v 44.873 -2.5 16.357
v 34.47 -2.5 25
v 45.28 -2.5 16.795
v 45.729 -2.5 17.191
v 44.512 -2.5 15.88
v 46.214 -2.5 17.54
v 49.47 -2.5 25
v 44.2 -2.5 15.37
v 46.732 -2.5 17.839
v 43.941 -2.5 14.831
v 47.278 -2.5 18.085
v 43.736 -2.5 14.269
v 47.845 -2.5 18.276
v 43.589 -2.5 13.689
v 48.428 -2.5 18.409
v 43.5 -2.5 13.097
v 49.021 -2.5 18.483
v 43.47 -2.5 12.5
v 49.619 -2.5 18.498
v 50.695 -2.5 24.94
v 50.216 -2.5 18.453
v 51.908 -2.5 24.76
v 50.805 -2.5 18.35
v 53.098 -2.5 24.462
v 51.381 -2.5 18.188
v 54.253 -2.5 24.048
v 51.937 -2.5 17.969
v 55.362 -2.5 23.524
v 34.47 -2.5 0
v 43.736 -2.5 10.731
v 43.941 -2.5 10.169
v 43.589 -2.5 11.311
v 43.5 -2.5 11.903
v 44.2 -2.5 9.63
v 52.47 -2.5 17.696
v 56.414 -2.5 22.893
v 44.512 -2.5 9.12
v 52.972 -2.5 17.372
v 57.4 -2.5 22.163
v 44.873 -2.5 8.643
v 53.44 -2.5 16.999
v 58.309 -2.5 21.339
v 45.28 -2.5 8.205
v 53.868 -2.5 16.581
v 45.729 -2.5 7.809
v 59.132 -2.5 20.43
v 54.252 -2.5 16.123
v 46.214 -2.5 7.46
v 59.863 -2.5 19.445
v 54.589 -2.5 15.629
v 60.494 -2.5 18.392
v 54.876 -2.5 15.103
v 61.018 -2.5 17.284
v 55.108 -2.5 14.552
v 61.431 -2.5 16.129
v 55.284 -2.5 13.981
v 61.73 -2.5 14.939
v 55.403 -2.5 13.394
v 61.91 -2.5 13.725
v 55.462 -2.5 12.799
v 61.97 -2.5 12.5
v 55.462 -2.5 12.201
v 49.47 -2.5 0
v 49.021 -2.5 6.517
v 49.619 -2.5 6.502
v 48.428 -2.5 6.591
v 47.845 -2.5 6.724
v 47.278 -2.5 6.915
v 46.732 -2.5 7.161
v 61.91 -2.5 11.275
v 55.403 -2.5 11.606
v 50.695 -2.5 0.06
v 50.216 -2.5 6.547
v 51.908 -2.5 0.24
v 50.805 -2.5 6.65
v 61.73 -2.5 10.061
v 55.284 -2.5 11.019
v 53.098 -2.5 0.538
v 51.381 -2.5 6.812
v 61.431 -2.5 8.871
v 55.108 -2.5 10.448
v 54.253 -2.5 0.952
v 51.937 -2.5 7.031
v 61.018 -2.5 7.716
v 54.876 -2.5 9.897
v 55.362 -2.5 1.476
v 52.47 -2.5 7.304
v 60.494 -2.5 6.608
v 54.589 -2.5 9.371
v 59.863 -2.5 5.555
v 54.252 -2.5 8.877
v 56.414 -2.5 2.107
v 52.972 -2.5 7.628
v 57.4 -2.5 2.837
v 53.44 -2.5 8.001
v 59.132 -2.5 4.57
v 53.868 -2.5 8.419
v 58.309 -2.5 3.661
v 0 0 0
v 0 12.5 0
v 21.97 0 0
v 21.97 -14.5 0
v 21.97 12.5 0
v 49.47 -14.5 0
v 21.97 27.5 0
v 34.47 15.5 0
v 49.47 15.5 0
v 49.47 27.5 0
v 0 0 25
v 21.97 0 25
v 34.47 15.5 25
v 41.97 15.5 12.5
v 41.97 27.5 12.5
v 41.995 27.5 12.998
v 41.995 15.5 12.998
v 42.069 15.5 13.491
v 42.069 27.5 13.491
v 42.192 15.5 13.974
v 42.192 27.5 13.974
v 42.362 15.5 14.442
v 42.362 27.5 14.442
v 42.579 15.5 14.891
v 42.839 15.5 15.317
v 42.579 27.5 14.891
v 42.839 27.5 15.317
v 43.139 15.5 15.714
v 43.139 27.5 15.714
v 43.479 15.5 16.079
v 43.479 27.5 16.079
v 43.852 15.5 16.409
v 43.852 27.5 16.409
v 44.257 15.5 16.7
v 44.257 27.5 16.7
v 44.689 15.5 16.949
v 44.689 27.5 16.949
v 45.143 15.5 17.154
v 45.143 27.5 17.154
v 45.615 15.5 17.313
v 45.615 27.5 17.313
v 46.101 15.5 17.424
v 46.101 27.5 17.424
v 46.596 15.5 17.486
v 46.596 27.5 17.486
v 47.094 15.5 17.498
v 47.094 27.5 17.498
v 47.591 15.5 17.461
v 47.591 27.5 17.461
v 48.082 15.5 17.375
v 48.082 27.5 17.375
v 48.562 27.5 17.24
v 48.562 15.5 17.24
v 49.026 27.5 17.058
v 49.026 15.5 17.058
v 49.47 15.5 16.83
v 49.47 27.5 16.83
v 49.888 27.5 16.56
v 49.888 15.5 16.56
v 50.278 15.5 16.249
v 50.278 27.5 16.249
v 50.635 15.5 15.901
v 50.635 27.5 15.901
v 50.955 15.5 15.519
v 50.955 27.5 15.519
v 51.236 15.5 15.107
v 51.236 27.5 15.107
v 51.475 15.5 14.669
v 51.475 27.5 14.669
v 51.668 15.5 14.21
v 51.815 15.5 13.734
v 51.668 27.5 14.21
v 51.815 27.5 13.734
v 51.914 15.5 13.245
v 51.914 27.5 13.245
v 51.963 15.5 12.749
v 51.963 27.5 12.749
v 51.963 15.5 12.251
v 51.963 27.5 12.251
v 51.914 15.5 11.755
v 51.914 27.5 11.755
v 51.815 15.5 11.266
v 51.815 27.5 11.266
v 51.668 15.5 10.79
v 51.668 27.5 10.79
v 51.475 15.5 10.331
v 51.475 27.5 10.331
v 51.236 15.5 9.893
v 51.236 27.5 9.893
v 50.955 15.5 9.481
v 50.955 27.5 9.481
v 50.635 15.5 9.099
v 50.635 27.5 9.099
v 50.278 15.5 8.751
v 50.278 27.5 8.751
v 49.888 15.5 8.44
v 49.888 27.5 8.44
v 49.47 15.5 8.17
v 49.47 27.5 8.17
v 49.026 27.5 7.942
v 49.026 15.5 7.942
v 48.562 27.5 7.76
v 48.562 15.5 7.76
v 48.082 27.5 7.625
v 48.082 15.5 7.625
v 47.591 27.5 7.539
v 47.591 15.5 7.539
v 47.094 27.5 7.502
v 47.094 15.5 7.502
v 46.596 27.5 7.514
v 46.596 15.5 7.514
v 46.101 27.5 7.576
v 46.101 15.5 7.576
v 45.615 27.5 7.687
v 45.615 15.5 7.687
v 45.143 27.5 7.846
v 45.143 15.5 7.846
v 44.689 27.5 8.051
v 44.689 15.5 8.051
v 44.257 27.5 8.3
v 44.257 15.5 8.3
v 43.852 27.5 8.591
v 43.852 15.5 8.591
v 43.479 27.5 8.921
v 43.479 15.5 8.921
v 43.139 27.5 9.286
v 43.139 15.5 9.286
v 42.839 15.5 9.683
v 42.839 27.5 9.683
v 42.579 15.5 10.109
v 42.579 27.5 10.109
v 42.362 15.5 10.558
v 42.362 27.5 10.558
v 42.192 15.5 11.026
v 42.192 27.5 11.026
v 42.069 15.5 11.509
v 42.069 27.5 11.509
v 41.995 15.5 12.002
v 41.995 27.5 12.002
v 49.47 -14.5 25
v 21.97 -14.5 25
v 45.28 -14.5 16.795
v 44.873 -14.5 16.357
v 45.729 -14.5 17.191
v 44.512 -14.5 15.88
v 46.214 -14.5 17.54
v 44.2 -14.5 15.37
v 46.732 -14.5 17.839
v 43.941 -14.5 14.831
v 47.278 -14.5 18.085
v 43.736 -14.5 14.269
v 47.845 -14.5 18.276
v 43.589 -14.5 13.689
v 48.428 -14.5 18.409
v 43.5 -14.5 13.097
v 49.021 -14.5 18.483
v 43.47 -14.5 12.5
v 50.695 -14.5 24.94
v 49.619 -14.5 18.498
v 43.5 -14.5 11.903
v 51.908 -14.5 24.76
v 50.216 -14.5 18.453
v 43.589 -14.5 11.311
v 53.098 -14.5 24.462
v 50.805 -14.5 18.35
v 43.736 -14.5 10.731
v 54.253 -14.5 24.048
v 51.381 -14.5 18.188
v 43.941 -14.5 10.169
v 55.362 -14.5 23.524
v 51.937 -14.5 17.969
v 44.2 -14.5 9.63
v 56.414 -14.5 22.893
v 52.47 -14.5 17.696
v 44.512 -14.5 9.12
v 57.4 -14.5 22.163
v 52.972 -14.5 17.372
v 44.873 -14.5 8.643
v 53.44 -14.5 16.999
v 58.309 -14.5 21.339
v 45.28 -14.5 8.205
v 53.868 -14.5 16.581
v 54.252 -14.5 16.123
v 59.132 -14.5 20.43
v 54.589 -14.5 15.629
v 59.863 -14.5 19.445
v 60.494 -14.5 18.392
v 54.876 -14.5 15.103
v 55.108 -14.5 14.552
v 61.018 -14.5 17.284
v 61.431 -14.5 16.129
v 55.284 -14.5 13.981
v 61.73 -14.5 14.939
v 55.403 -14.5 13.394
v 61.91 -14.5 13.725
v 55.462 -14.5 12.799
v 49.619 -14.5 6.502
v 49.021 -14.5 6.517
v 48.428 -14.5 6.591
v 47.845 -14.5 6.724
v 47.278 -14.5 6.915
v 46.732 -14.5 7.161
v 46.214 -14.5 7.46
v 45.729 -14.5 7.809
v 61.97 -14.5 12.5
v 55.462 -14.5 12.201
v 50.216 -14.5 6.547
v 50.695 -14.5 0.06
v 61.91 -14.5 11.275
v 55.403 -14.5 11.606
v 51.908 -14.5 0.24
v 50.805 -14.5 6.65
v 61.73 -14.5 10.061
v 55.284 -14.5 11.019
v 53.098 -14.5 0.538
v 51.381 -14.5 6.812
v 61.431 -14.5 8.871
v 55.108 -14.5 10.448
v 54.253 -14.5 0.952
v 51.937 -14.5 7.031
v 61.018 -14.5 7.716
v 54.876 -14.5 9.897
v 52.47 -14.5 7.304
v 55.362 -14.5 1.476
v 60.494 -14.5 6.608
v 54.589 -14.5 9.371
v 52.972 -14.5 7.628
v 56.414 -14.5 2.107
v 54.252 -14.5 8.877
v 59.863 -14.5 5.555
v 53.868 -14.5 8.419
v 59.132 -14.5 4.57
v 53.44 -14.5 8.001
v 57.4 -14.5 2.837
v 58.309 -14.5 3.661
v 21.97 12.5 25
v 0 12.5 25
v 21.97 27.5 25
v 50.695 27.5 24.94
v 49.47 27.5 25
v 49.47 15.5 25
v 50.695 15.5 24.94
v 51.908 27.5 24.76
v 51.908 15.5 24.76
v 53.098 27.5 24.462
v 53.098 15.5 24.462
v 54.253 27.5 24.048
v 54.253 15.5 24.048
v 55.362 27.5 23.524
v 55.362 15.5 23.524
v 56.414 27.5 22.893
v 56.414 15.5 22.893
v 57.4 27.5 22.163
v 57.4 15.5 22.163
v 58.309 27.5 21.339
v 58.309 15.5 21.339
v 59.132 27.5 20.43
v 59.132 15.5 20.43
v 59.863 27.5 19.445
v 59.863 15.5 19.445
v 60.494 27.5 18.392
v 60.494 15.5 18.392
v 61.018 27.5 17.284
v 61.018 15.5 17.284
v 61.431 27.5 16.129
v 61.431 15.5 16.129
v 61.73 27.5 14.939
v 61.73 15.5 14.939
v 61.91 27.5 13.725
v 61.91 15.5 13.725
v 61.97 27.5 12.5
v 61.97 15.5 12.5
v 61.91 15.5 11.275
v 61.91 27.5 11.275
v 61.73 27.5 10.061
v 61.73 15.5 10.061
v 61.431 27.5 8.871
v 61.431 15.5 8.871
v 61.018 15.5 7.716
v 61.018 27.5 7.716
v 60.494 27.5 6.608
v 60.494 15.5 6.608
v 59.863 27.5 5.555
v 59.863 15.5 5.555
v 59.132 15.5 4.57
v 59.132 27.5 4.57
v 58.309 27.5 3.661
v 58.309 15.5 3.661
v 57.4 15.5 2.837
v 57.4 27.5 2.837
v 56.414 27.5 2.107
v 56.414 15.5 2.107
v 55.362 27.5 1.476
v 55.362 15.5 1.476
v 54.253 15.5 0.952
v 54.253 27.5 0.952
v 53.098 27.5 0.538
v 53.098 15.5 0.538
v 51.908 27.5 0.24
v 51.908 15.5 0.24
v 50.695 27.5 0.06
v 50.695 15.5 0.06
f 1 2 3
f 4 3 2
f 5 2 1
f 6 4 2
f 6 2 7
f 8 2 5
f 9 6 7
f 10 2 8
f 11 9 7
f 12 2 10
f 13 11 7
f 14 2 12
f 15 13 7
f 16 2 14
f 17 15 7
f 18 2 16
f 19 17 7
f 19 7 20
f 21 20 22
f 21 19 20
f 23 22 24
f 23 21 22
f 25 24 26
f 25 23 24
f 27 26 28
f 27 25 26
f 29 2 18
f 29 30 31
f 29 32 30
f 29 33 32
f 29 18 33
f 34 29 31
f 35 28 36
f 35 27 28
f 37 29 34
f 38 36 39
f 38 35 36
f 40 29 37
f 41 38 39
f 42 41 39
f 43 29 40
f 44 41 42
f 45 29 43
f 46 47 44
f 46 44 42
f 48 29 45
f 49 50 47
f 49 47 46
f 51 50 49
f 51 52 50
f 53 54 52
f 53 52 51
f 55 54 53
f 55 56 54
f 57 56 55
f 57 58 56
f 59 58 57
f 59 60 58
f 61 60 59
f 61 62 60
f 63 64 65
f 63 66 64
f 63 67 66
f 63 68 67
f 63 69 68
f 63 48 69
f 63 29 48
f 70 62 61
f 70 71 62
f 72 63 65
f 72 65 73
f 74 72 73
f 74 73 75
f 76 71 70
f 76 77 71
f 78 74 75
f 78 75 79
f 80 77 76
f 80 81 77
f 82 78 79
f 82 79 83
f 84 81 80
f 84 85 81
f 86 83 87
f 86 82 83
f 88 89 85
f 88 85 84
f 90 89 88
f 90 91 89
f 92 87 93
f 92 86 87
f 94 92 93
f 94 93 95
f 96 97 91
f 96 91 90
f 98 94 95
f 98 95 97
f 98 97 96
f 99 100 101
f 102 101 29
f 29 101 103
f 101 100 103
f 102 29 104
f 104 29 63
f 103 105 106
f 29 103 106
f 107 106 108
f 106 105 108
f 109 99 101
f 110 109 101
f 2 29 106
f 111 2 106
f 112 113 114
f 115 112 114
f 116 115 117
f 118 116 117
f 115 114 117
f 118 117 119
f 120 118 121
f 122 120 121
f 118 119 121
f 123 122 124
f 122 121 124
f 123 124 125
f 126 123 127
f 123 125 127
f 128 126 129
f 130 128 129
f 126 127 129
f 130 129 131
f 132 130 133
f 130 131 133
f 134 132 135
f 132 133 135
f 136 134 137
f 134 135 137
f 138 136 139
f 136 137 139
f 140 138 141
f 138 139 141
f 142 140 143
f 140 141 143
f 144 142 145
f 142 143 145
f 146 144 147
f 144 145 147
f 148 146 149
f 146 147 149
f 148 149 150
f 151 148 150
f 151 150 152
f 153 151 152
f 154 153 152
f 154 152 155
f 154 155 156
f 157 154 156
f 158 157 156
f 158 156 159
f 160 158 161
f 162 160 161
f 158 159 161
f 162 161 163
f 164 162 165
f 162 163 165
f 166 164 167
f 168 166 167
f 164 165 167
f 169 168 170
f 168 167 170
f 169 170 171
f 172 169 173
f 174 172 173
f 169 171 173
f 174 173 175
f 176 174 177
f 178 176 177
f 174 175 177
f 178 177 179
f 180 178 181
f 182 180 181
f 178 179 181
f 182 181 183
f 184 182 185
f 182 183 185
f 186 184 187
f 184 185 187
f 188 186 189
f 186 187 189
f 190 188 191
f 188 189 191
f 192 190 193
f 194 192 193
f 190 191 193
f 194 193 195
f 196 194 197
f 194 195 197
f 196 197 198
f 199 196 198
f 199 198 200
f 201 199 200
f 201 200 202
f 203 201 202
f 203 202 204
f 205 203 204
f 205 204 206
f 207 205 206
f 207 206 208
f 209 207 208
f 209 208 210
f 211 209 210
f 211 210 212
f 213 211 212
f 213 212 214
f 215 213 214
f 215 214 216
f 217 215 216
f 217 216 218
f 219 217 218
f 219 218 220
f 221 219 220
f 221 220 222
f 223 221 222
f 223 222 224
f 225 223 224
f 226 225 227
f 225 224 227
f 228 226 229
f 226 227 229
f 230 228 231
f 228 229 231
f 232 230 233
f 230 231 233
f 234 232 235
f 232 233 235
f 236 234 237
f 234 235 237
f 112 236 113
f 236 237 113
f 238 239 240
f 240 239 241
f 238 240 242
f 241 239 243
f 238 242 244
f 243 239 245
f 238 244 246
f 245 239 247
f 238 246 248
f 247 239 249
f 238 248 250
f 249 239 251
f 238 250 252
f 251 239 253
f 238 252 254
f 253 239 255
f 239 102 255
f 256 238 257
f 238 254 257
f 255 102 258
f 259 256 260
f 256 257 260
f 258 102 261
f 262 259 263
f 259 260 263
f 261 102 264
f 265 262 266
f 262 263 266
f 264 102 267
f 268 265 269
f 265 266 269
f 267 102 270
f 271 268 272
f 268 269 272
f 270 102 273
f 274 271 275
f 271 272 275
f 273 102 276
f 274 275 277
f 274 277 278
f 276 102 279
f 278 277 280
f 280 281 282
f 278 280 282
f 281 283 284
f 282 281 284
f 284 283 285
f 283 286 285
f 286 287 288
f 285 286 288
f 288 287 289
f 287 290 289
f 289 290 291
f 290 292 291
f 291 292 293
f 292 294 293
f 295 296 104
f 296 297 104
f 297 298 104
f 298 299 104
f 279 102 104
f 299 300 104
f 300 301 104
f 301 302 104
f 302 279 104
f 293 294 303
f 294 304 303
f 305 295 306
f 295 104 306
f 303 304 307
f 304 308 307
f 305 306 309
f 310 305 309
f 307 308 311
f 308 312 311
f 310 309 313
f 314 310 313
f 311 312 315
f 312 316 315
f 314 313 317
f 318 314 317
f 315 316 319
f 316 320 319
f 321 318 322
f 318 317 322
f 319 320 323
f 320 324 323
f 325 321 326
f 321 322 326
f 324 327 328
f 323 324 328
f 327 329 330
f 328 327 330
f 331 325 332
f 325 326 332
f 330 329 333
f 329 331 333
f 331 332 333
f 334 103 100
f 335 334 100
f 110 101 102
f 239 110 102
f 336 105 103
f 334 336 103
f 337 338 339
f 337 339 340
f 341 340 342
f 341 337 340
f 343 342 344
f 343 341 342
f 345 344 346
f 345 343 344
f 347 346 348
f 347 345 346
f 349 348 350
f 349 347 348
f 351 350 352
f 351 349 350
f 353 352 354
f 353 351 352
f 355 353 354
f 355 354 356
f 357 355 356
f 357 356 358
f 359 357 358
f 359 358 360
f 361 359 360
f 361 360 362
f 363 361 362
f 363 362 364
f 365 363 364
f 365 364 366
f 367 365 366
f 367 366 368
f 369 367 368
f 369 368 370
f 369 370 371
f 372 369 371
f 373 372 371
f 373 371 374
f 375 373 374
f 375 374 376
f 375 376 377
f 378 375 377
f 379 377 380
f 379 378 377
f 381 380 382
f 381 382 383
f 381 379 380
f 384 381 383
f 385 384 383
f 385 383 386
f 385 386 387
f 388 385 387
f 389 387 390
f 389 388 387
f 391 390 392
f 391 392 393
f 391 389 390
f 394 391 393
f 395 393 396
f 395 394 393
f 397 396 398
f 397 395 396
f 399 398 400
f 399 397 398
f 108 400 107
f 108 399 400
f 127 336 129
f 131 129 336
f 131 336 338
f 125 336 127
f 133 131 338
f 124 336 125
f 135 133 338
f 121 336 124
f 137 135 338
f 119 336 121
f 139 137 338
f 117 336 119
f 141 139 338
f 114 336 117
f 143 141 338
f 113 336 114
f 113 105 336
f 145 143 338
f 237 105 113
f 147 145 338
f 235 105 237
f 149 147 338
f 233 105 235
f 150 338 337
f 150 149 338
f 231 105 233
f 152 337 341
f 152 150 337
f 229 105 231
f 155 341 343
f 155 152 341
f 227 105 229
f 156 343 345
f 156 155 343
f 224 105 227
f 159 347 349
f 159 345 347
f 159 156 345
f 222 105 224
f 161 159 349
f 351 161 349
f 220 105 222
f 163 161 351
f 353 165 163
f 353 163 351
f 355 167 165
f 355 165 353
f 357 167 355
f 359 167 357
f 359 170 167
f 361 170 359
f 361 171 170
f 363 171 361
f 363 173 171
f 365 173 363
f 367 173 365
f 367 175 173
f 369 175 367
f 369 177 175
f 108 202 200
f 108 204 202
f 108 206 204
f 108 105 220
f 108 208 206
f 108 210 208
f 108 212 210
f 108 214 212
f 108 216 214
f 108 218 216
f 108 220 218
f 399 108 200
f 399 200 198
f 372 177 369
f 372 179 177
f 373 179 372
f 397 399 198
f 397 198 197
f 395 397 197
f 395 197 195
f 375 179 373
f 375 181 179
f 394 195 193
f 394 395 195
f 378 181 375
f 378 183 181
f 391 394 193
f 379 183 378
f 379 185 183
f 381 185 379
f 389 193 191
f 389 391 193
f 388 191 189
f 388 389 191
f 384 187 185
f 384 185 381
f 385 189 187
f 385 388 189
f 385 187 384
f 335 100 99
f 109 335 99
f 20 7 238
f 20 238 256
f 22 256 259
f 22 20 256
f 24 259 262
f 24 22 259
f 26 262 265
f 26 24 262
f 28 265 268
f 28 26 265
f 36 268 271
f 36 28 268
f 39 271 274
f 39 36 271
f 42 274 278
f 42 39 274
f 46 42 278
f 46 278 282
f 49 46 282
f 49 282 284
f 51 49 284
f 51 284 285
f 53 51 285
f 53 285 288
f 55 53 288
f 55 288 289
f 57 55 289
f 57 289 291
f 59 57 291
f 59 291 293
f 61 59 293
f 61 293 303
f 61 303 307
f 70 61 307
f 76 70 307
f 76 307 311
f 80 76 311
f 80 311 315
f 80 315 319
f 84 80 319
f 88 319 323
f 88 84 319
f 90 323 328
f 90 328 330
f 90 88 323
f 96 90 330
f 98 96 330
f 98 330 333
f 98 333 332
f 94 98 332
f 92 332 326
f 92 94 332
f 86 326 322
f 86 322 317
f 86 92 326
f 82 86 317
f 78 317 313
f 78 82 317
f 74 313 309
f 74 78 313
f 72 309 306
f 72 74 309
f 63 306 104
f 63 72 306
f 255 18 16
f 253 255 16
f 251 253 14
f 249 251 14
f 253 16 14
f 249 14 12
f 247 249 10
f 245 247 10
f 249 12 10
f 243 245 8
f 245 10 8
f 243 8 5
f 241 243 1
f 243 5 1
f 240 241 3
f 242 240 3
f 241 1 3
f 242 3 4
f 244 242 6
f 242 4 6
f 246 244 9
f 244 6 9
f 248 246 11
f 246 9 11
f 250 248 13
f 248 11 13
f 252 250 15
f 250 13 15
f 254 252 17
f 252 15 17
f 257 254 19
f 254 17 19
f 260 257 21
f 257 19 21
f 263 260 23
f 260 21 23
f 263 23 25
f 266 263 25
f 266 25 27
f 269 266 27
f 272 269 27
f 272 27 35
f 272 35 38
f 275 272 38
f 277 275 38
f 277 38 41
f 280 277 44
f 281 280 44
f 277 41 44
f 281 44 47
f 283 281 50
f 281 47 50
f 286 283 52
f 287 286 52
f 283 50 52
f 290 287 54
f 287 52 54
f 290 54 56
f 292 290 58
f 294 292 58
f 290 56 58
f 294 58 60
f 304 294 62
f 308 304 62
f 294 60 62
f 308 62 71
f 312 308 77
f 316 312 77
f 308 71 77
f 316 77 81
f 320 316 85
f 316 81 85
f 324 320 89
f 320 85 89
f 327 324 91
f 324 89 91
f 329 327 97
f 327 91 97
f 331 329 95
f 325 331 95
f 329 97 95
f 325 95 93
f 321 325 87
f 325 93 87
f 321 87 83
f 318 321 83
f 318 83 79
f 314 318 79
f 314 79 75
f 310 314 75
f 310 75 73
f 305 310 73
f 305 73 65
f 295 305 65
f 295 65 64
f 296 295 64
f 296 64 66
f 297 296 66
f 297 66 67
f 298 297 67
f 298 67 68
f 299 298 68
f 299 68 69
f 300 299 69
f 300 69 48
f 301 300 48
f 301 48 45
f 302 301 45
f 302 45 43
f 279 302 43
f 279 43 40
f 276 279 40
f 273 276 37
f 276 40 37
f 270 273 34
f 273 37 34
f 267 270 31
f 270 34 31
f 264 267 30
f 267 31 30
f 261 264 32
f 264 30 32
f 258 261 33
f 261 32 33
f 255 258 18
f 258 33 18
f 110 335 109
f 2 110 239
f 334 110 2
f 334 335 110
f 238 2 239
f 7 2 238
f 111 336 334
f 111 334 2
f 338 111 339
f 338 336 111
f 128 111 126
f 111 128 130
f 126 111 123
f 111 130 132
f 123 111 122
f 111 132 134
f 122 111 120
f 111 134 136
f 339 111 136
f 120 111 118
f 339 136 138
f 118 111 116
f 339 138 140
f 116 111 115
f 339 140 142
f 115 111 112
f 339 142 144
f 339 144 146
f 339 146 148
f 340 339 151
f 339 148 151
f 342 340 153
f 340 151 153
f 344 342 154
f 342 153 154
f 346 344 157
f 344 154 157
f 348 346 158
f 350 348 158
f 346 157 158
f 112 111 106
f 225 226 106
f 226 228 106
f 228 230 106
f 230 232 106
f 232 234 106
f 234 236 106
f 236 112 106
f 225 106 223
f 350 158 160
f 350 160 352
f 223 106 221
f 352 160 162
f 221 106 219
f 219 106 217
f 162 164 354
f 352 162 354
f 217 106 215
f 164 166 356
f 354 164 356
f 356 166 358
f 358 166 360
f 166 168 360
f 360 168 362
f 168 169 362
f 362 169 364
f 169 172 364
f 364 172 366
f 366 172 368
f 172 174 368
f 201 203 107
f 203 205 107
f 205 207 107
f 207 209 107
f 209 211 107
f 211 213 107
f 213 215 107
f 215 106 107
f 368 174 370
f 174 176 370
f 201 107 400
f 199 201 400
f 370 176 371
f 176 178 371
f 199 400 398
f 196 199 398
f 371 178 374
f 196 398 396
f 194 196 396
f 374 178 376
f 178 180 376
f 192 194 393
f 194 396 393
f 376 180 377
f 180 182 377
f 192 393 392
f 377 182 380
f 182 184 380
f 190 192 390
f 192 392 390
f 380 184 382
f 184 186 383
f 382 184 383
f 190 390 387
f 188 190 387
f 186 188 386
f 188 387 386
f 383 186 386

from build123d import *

# Parameters (mm, degrees)
BOSS_EXTRUDE1_DEPTH = 25
SKETCH2_R           = 12.5
BOSS_EXTRUDE2_DEPTH = 12
SKETCH3_R           = 12.5
BOSS_EXTRUDE3_DEPTH = 12
SKETCH4_R           = 5
CUT_EXTRUDE1_DEPTH  = 12
SKETCH5_R           = 6
CUT_EXTRUDE2_DEPTH  = 12


with BuildPart() as part:
    # Sketch1 → Boss-Extrude1 (new body)
    with BuildSketch(Plane.XY):
        Polygon((0, 0), (21.96969697, 0), (21.96969697, -14.5), (49.46969697, -14.5), (49.46969697, -2.5), (34.46969697, -2.5), (34.46969697, 15.5), (49.46969697, 15.5), (49.46969697, 27.5), (21.96969697, 27.5), (21.96969697, 12.5), (0, 12.5), align=None)
    extrude(amount=BOSS_EXTRUDE1_DEPTH)

    # Sketch2 → Boss-Extrude2 (add)
    with BuildSketch(Plane(origin=(0, 27.5, 0), x_dir=(1, 0, 0), z_dir=(0, 1, 0))):
        with Locations((49.46969697, -12.5)):
            Circle(SKETCH2_R)
    extrude(amount=-BOSS_EXTRUDE2_DEPTH)

    # Sketch3 → Boss-Extrude3 (add)
    with BuildSketch(Plane(origin=(0, -2.5, 0), x_dir=(1, 0, 0), z_dir=(0, 1, 0))):
        with Locations((49.46969697, -12.5)):
            Circle(SKETCH3_R)
    extrude(amount=-BOSS_EXTRUDE3_DEPTH)

    # Sketch4 → Cut-Extrude1 (cut)
    with BuildSketch(Plane(origin=(0, 27.5, 0), x_dir=(1, 0, 0), z_dir=(0, 1, 0))):
        with Locations(Location((46.96969697, -12.5, 0), (0, 0, 180))):
            Circle(SKETCH4_R)
    extrude(amount=-CUT_EXTRUDE1_DEPTH, mode=Mode.SUBTRACT)

    # Sketch5 → Cut-Extrude2 (cut)
    with BuildSketch(Plane(origin=(0, -2.5, 0), x_dir=(1, 0, 0), z_dir=(0, 1, 0))):
        with Locations(Location((49.46969697, -12.5, 0), (0, 0, 180))):
            Circle(SKETCH5_R)
    extrude(amount=-CUT_EXTRUDE2_DEPTH, mode=Mode.SUBTRACT)


solid = part.part
